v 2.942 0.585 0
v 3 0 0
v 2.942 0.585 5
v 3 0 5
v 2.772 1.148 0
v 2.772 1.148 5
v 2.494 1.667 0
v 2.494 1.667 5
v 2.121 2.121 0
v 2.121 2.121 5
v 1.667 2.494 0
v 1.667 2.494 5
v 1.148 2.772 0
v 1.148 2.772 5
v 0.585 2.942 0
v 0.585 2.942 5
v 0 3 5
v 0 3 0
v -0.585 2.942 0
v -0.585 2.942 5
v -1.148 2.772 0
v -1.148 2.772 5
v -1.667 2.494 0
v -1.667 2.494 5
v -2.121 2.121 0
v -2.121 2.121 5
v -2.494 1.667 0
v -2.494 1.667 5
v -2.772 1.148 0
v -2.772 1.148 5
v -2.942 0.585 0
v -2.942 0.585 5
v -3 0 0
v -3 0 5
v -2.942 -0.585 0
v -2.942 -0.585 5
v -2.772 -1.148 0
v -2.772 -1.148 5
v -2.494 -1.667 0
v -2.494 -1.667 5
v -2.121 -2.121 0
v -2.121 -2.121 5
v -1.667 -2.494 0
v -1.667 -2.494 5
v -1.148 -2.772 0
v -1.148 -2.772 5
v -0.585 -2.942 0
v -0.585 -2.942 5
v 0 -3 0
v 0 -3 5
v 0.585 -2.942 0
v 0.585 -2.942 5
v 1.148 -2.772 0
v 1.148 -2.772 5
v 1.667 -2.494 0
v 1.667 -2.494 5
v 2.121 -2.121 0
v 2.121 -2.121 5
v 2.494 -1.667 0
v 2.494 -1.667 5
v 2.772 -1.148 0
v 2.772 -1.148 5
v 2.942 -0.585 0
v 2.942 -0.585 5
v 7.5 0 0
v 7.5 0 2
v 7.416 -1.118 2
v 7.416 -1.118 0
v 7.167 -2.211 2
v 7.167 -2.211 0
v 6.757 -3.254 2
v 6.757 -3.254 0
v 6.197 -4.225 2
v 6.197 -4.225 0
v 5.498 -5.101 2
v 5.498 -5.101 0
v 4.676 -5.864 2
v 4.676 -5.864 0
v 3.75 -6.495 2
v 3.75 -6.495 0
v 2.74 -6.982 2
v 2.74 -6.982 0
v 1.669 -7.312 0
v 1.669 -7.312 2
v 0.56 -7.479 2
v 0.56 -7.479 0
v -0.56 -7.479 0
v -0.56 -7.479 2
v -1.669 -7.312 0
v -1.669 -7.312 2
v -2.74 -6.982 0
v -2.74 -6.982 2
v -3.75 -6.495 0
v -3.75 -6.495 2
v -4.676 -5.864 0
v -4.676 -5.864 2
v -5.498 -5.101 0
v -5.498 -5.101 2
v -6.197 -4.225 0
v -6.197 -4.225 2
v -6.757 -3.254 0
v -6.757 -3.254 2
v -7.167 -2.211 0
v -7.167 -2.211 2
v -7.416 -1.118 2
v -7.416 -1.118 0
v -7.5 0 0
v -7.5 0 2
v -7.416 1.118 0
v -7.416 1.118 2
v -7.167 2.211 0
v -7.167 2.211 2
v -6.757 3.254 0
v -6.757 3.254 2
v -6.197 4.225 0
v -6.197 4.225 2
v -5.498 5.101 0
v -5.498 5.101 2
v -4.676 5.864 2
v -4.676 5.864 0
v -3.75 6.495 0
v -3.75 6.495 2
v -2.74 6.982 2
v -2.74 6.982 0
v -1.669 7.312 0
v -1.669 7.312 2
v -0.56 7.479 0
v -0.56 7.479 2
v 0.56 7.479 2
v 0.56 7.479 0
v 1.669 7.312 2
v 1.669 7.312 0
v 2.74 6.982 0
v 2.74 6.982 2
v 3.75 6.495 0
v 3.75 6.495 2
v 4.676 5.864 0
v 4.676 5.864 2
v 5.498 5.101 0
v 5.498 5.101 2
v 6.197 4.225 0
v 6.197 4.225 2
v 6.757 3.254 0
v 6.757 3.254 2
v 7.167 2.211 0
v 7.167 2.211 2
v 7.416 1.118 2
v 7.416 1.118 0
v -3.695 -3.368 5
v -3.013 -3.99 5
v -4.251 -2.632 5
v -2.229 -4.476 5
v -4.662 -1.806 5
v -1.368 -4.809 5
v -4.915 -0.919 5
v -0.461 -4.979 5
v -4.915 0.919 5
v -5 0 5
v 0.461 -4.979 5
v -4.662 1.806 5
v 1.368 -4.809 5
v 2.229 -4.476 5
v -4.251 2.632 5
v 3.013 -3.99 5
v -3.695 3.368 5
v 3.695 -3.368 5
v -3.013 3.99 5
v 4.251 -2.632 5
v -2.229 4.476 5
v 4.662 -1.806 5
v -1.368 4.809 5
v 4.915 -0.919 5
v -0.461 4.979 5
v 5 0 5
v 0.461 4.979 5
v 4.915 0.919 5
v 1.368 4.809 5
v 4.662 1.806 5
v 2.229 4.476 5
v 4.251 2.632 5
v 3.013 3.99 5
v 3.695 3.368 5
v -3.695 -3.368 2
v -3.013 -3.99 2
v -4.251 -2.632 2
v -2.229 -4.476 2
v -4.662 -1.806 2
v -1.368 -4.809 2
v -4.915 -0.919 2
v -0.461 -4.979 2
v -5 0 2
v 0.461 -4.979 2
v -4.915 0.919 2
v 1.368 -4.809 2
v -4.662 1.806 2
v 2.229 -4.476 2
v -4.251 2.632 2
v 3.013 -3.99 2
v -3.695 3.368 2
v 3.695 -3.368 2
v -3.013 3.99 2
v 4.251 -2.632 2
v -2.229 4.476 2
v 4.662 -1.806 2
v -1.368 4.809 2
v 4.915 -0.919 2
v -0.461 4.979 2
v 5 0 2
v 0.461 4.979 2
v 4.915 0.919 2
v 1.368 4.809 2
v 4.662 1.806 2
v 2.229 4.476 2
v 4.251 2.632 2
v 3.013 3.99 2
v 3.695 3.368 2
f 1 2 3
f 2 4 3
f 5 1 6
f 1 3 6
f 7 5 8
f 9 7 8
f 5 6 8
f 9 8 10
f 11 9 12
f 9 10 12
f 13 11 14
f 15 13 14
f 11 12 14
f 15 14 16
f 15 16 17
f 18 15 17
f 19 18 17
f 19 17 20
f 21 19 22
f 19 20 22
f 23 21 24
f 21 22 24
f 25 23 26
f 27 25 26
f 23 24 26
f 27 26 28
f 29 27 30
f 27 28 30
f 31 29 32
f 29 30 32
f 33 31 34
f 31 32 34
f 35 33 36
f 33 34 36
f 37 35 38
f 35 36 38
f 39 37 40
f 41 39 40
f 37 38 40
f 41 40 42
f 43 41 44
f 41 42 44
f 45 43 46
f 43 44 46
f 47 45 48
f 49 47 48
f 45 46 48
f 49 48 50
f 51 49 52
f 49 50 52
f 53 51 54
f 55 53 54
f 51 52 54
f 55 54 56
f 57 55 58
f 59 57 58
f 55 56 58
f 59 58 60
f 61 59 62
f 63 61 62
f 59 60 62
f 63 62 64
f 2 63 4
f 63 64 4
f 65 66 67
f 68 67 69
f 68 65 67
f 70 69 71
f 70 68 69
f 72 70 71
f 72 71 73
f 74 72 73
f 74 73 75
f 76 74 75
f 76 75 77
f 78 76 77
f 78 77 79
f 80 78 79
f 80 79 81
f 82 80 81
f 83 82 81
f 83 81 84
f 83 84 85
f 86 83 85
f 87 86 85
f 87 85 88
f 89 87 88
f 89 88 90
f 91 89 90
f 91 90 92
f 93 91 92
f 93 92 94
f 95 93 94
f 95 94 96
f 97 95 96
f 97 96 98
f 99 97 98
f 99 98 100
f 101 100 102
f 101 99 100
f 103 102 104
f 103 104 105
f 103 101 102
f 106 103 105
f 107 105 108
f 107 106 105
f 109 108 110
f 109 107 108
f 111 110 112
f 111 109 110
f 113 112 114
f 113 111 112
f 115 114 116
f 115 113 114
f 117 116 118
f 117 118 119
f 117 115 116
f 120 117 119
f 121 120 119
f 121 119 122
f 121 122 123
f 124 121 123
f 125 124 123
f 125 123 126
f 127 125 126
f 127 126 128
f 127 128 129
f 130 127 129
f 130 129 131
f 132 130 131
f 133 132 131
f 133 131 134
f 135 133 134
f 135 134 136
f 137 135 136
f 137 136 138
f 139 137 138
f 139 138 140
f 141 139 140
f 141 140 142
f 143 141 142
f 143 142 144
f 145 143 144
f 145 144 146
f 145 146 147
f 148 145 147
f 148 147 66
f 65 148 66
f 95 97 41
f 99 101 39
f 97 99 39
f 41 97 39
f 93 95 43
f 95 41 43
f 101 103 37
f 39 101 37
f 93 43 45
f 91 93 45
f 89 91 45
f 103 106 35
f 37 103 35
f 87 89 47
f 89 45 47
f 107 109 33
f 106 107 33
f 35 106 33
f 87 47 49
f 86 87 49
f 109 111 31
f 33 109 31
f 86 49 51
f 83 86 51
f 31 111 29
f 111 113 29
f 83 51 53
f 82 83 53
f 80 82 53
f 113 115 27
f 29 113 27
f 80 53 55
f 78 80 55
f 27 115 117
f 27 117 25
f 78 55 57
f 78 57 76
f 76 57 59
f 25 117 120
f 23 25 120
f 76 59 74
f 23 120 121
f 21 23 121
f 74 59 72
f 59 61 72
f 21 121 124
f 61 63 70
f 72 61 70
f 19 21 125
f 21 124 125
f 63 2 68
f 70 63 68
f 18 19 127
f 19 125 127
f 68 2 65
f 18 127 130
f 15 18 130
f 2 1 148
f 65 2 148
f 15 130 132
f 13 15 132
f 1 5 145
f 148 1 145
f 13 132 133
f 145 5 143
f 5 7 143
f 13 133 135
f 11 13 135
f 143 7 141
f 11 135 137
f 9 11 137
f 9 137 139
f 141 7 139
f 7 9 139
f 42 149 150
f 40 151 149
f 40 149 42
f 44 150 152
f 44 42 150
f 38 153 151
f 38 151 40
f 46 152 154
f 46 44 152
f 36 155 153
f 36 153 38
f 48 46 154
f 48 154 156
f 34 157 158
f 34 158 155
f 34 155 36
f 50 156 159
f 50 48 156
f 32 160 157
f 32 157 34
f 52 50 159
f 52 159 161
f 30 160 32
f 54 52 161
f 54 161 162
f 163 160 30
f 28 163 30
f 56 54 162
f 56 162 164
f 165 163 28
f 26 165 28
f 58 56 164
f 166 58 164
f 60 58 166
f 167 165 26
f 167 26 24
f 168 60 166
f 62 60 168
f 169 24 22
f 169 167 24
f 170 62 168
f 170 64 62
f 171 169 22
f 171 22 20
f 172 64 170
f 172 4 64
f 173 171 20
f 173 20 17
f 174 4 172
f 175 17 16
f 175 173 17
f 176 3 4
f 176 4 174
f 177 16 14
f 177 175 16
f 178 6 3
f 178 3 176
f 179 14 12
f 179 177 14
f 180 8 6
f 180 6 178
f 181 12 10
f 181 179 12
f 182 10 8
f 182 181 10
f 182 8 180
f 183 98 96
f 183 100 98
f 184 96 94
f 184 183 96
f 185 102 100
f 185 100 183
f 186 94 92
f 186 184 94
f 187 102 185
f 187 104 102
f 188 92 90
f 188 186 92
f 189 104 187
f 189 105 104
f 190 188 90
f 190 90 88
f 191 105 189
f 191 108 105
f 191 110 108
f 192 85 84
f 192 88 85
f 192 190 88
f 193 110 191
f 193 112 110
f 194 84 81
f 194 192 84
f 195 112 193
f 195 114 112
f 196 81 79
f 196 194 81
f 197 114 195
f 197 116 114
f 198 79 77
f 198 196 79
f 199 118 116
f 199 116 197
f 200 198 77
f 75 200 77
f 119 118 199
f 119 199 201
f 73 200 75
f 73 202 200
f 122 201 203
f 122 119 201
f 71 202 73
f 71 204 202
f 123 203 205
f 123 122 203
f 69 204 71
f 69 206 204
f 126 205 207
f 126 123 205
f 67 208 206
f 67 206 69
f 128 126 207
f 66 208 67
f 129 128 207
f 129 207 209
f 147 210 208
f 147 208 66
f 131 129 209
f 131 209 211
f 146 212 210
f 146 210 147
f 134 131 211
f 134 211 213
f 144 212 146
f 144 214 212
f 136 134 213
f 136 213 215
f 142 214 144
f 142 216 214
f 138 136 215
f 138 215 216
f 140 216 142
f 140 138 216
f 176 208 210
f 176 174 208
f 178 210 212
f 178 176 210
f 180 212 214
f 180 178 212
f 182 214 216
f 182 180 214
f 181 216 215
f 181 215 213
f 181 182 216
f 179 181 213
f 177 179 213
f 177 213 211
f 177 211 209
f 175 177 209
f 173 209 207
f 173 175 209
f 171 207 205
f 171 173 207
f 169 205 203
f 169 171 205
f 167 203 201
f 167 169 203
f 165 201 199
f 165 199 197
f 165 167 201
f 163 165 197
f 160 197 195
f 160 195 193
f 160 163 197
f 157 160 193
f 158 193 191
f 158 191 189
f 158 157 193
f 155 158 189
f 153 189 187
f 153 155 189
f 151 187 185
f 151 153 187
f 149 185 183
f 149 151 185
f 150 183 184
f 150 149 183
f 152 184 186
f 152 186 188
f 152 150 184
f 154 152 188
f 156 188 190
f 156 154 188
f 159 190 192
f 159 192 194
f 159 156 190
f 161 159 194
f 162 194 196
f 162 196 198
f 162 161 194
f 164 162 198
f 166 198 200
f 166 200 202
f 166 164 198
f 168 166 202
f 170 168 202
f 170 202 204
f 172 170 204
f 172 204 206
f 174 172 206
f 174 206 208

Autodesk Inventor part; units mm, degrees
ref_plane "YZ Plane" through (0, 0, 0) normal (1, 0, 0) x (0, 1, 0)
ref_plane "XZ Plane" through (0, 0, 0) normal (0, 1, 0) x (-1, 0, 0)
ref_plane "XY Plane" through (0, 0, 0) normal (0, 0, 1) x (1, 0, 0)
sketch "スケッチ1" plane through (0, 0, 0) normal (0, 0, 1) x (1, 0, 0)
  circle A0 centre (0, 0) radius 5
  circle A1 centre (0, 0) radius 7.5
  dimension "d0" = 10
  dimension "d1" = 15
extrude "押し出し1" add sketch "スケッチ1" along normal blind 8 contours A0 | A1
sketch "スケッチ2" plane through (0, 0, 8) normal (0, 0, 1) x (1, 0, 0)
  circle A0 centre (0, 0) radius 5
  circle A1 centre (0, 0) radius 3
  circle A2 centre (0, 0) radius 10
  dimension "d4" = 10
  dimension "d5" = 6
  dimension "d8" = 20
extrude "押し出し2" cut sketch "スケッチ2" against normal blind 6
sketch "スケッチ4" plane through (0, 0, 2) normal (0, 0, 1) x (1, 0, 0)
  circle A0 centre (0, 0) radius 3
extrude "押し出し4" cut sketch "スケッチ4" against normal blind 5
sketch "スケッチ5" plane through (0, 0, 8) normal (0, 0, 1) x (1, 0, 0)
  circle A0 centre (0, 0) radius 10.699
extrude "押し出し5" cut sketch "スケッチ5" against normal blind 3
properties part number "10mm_bearing"
